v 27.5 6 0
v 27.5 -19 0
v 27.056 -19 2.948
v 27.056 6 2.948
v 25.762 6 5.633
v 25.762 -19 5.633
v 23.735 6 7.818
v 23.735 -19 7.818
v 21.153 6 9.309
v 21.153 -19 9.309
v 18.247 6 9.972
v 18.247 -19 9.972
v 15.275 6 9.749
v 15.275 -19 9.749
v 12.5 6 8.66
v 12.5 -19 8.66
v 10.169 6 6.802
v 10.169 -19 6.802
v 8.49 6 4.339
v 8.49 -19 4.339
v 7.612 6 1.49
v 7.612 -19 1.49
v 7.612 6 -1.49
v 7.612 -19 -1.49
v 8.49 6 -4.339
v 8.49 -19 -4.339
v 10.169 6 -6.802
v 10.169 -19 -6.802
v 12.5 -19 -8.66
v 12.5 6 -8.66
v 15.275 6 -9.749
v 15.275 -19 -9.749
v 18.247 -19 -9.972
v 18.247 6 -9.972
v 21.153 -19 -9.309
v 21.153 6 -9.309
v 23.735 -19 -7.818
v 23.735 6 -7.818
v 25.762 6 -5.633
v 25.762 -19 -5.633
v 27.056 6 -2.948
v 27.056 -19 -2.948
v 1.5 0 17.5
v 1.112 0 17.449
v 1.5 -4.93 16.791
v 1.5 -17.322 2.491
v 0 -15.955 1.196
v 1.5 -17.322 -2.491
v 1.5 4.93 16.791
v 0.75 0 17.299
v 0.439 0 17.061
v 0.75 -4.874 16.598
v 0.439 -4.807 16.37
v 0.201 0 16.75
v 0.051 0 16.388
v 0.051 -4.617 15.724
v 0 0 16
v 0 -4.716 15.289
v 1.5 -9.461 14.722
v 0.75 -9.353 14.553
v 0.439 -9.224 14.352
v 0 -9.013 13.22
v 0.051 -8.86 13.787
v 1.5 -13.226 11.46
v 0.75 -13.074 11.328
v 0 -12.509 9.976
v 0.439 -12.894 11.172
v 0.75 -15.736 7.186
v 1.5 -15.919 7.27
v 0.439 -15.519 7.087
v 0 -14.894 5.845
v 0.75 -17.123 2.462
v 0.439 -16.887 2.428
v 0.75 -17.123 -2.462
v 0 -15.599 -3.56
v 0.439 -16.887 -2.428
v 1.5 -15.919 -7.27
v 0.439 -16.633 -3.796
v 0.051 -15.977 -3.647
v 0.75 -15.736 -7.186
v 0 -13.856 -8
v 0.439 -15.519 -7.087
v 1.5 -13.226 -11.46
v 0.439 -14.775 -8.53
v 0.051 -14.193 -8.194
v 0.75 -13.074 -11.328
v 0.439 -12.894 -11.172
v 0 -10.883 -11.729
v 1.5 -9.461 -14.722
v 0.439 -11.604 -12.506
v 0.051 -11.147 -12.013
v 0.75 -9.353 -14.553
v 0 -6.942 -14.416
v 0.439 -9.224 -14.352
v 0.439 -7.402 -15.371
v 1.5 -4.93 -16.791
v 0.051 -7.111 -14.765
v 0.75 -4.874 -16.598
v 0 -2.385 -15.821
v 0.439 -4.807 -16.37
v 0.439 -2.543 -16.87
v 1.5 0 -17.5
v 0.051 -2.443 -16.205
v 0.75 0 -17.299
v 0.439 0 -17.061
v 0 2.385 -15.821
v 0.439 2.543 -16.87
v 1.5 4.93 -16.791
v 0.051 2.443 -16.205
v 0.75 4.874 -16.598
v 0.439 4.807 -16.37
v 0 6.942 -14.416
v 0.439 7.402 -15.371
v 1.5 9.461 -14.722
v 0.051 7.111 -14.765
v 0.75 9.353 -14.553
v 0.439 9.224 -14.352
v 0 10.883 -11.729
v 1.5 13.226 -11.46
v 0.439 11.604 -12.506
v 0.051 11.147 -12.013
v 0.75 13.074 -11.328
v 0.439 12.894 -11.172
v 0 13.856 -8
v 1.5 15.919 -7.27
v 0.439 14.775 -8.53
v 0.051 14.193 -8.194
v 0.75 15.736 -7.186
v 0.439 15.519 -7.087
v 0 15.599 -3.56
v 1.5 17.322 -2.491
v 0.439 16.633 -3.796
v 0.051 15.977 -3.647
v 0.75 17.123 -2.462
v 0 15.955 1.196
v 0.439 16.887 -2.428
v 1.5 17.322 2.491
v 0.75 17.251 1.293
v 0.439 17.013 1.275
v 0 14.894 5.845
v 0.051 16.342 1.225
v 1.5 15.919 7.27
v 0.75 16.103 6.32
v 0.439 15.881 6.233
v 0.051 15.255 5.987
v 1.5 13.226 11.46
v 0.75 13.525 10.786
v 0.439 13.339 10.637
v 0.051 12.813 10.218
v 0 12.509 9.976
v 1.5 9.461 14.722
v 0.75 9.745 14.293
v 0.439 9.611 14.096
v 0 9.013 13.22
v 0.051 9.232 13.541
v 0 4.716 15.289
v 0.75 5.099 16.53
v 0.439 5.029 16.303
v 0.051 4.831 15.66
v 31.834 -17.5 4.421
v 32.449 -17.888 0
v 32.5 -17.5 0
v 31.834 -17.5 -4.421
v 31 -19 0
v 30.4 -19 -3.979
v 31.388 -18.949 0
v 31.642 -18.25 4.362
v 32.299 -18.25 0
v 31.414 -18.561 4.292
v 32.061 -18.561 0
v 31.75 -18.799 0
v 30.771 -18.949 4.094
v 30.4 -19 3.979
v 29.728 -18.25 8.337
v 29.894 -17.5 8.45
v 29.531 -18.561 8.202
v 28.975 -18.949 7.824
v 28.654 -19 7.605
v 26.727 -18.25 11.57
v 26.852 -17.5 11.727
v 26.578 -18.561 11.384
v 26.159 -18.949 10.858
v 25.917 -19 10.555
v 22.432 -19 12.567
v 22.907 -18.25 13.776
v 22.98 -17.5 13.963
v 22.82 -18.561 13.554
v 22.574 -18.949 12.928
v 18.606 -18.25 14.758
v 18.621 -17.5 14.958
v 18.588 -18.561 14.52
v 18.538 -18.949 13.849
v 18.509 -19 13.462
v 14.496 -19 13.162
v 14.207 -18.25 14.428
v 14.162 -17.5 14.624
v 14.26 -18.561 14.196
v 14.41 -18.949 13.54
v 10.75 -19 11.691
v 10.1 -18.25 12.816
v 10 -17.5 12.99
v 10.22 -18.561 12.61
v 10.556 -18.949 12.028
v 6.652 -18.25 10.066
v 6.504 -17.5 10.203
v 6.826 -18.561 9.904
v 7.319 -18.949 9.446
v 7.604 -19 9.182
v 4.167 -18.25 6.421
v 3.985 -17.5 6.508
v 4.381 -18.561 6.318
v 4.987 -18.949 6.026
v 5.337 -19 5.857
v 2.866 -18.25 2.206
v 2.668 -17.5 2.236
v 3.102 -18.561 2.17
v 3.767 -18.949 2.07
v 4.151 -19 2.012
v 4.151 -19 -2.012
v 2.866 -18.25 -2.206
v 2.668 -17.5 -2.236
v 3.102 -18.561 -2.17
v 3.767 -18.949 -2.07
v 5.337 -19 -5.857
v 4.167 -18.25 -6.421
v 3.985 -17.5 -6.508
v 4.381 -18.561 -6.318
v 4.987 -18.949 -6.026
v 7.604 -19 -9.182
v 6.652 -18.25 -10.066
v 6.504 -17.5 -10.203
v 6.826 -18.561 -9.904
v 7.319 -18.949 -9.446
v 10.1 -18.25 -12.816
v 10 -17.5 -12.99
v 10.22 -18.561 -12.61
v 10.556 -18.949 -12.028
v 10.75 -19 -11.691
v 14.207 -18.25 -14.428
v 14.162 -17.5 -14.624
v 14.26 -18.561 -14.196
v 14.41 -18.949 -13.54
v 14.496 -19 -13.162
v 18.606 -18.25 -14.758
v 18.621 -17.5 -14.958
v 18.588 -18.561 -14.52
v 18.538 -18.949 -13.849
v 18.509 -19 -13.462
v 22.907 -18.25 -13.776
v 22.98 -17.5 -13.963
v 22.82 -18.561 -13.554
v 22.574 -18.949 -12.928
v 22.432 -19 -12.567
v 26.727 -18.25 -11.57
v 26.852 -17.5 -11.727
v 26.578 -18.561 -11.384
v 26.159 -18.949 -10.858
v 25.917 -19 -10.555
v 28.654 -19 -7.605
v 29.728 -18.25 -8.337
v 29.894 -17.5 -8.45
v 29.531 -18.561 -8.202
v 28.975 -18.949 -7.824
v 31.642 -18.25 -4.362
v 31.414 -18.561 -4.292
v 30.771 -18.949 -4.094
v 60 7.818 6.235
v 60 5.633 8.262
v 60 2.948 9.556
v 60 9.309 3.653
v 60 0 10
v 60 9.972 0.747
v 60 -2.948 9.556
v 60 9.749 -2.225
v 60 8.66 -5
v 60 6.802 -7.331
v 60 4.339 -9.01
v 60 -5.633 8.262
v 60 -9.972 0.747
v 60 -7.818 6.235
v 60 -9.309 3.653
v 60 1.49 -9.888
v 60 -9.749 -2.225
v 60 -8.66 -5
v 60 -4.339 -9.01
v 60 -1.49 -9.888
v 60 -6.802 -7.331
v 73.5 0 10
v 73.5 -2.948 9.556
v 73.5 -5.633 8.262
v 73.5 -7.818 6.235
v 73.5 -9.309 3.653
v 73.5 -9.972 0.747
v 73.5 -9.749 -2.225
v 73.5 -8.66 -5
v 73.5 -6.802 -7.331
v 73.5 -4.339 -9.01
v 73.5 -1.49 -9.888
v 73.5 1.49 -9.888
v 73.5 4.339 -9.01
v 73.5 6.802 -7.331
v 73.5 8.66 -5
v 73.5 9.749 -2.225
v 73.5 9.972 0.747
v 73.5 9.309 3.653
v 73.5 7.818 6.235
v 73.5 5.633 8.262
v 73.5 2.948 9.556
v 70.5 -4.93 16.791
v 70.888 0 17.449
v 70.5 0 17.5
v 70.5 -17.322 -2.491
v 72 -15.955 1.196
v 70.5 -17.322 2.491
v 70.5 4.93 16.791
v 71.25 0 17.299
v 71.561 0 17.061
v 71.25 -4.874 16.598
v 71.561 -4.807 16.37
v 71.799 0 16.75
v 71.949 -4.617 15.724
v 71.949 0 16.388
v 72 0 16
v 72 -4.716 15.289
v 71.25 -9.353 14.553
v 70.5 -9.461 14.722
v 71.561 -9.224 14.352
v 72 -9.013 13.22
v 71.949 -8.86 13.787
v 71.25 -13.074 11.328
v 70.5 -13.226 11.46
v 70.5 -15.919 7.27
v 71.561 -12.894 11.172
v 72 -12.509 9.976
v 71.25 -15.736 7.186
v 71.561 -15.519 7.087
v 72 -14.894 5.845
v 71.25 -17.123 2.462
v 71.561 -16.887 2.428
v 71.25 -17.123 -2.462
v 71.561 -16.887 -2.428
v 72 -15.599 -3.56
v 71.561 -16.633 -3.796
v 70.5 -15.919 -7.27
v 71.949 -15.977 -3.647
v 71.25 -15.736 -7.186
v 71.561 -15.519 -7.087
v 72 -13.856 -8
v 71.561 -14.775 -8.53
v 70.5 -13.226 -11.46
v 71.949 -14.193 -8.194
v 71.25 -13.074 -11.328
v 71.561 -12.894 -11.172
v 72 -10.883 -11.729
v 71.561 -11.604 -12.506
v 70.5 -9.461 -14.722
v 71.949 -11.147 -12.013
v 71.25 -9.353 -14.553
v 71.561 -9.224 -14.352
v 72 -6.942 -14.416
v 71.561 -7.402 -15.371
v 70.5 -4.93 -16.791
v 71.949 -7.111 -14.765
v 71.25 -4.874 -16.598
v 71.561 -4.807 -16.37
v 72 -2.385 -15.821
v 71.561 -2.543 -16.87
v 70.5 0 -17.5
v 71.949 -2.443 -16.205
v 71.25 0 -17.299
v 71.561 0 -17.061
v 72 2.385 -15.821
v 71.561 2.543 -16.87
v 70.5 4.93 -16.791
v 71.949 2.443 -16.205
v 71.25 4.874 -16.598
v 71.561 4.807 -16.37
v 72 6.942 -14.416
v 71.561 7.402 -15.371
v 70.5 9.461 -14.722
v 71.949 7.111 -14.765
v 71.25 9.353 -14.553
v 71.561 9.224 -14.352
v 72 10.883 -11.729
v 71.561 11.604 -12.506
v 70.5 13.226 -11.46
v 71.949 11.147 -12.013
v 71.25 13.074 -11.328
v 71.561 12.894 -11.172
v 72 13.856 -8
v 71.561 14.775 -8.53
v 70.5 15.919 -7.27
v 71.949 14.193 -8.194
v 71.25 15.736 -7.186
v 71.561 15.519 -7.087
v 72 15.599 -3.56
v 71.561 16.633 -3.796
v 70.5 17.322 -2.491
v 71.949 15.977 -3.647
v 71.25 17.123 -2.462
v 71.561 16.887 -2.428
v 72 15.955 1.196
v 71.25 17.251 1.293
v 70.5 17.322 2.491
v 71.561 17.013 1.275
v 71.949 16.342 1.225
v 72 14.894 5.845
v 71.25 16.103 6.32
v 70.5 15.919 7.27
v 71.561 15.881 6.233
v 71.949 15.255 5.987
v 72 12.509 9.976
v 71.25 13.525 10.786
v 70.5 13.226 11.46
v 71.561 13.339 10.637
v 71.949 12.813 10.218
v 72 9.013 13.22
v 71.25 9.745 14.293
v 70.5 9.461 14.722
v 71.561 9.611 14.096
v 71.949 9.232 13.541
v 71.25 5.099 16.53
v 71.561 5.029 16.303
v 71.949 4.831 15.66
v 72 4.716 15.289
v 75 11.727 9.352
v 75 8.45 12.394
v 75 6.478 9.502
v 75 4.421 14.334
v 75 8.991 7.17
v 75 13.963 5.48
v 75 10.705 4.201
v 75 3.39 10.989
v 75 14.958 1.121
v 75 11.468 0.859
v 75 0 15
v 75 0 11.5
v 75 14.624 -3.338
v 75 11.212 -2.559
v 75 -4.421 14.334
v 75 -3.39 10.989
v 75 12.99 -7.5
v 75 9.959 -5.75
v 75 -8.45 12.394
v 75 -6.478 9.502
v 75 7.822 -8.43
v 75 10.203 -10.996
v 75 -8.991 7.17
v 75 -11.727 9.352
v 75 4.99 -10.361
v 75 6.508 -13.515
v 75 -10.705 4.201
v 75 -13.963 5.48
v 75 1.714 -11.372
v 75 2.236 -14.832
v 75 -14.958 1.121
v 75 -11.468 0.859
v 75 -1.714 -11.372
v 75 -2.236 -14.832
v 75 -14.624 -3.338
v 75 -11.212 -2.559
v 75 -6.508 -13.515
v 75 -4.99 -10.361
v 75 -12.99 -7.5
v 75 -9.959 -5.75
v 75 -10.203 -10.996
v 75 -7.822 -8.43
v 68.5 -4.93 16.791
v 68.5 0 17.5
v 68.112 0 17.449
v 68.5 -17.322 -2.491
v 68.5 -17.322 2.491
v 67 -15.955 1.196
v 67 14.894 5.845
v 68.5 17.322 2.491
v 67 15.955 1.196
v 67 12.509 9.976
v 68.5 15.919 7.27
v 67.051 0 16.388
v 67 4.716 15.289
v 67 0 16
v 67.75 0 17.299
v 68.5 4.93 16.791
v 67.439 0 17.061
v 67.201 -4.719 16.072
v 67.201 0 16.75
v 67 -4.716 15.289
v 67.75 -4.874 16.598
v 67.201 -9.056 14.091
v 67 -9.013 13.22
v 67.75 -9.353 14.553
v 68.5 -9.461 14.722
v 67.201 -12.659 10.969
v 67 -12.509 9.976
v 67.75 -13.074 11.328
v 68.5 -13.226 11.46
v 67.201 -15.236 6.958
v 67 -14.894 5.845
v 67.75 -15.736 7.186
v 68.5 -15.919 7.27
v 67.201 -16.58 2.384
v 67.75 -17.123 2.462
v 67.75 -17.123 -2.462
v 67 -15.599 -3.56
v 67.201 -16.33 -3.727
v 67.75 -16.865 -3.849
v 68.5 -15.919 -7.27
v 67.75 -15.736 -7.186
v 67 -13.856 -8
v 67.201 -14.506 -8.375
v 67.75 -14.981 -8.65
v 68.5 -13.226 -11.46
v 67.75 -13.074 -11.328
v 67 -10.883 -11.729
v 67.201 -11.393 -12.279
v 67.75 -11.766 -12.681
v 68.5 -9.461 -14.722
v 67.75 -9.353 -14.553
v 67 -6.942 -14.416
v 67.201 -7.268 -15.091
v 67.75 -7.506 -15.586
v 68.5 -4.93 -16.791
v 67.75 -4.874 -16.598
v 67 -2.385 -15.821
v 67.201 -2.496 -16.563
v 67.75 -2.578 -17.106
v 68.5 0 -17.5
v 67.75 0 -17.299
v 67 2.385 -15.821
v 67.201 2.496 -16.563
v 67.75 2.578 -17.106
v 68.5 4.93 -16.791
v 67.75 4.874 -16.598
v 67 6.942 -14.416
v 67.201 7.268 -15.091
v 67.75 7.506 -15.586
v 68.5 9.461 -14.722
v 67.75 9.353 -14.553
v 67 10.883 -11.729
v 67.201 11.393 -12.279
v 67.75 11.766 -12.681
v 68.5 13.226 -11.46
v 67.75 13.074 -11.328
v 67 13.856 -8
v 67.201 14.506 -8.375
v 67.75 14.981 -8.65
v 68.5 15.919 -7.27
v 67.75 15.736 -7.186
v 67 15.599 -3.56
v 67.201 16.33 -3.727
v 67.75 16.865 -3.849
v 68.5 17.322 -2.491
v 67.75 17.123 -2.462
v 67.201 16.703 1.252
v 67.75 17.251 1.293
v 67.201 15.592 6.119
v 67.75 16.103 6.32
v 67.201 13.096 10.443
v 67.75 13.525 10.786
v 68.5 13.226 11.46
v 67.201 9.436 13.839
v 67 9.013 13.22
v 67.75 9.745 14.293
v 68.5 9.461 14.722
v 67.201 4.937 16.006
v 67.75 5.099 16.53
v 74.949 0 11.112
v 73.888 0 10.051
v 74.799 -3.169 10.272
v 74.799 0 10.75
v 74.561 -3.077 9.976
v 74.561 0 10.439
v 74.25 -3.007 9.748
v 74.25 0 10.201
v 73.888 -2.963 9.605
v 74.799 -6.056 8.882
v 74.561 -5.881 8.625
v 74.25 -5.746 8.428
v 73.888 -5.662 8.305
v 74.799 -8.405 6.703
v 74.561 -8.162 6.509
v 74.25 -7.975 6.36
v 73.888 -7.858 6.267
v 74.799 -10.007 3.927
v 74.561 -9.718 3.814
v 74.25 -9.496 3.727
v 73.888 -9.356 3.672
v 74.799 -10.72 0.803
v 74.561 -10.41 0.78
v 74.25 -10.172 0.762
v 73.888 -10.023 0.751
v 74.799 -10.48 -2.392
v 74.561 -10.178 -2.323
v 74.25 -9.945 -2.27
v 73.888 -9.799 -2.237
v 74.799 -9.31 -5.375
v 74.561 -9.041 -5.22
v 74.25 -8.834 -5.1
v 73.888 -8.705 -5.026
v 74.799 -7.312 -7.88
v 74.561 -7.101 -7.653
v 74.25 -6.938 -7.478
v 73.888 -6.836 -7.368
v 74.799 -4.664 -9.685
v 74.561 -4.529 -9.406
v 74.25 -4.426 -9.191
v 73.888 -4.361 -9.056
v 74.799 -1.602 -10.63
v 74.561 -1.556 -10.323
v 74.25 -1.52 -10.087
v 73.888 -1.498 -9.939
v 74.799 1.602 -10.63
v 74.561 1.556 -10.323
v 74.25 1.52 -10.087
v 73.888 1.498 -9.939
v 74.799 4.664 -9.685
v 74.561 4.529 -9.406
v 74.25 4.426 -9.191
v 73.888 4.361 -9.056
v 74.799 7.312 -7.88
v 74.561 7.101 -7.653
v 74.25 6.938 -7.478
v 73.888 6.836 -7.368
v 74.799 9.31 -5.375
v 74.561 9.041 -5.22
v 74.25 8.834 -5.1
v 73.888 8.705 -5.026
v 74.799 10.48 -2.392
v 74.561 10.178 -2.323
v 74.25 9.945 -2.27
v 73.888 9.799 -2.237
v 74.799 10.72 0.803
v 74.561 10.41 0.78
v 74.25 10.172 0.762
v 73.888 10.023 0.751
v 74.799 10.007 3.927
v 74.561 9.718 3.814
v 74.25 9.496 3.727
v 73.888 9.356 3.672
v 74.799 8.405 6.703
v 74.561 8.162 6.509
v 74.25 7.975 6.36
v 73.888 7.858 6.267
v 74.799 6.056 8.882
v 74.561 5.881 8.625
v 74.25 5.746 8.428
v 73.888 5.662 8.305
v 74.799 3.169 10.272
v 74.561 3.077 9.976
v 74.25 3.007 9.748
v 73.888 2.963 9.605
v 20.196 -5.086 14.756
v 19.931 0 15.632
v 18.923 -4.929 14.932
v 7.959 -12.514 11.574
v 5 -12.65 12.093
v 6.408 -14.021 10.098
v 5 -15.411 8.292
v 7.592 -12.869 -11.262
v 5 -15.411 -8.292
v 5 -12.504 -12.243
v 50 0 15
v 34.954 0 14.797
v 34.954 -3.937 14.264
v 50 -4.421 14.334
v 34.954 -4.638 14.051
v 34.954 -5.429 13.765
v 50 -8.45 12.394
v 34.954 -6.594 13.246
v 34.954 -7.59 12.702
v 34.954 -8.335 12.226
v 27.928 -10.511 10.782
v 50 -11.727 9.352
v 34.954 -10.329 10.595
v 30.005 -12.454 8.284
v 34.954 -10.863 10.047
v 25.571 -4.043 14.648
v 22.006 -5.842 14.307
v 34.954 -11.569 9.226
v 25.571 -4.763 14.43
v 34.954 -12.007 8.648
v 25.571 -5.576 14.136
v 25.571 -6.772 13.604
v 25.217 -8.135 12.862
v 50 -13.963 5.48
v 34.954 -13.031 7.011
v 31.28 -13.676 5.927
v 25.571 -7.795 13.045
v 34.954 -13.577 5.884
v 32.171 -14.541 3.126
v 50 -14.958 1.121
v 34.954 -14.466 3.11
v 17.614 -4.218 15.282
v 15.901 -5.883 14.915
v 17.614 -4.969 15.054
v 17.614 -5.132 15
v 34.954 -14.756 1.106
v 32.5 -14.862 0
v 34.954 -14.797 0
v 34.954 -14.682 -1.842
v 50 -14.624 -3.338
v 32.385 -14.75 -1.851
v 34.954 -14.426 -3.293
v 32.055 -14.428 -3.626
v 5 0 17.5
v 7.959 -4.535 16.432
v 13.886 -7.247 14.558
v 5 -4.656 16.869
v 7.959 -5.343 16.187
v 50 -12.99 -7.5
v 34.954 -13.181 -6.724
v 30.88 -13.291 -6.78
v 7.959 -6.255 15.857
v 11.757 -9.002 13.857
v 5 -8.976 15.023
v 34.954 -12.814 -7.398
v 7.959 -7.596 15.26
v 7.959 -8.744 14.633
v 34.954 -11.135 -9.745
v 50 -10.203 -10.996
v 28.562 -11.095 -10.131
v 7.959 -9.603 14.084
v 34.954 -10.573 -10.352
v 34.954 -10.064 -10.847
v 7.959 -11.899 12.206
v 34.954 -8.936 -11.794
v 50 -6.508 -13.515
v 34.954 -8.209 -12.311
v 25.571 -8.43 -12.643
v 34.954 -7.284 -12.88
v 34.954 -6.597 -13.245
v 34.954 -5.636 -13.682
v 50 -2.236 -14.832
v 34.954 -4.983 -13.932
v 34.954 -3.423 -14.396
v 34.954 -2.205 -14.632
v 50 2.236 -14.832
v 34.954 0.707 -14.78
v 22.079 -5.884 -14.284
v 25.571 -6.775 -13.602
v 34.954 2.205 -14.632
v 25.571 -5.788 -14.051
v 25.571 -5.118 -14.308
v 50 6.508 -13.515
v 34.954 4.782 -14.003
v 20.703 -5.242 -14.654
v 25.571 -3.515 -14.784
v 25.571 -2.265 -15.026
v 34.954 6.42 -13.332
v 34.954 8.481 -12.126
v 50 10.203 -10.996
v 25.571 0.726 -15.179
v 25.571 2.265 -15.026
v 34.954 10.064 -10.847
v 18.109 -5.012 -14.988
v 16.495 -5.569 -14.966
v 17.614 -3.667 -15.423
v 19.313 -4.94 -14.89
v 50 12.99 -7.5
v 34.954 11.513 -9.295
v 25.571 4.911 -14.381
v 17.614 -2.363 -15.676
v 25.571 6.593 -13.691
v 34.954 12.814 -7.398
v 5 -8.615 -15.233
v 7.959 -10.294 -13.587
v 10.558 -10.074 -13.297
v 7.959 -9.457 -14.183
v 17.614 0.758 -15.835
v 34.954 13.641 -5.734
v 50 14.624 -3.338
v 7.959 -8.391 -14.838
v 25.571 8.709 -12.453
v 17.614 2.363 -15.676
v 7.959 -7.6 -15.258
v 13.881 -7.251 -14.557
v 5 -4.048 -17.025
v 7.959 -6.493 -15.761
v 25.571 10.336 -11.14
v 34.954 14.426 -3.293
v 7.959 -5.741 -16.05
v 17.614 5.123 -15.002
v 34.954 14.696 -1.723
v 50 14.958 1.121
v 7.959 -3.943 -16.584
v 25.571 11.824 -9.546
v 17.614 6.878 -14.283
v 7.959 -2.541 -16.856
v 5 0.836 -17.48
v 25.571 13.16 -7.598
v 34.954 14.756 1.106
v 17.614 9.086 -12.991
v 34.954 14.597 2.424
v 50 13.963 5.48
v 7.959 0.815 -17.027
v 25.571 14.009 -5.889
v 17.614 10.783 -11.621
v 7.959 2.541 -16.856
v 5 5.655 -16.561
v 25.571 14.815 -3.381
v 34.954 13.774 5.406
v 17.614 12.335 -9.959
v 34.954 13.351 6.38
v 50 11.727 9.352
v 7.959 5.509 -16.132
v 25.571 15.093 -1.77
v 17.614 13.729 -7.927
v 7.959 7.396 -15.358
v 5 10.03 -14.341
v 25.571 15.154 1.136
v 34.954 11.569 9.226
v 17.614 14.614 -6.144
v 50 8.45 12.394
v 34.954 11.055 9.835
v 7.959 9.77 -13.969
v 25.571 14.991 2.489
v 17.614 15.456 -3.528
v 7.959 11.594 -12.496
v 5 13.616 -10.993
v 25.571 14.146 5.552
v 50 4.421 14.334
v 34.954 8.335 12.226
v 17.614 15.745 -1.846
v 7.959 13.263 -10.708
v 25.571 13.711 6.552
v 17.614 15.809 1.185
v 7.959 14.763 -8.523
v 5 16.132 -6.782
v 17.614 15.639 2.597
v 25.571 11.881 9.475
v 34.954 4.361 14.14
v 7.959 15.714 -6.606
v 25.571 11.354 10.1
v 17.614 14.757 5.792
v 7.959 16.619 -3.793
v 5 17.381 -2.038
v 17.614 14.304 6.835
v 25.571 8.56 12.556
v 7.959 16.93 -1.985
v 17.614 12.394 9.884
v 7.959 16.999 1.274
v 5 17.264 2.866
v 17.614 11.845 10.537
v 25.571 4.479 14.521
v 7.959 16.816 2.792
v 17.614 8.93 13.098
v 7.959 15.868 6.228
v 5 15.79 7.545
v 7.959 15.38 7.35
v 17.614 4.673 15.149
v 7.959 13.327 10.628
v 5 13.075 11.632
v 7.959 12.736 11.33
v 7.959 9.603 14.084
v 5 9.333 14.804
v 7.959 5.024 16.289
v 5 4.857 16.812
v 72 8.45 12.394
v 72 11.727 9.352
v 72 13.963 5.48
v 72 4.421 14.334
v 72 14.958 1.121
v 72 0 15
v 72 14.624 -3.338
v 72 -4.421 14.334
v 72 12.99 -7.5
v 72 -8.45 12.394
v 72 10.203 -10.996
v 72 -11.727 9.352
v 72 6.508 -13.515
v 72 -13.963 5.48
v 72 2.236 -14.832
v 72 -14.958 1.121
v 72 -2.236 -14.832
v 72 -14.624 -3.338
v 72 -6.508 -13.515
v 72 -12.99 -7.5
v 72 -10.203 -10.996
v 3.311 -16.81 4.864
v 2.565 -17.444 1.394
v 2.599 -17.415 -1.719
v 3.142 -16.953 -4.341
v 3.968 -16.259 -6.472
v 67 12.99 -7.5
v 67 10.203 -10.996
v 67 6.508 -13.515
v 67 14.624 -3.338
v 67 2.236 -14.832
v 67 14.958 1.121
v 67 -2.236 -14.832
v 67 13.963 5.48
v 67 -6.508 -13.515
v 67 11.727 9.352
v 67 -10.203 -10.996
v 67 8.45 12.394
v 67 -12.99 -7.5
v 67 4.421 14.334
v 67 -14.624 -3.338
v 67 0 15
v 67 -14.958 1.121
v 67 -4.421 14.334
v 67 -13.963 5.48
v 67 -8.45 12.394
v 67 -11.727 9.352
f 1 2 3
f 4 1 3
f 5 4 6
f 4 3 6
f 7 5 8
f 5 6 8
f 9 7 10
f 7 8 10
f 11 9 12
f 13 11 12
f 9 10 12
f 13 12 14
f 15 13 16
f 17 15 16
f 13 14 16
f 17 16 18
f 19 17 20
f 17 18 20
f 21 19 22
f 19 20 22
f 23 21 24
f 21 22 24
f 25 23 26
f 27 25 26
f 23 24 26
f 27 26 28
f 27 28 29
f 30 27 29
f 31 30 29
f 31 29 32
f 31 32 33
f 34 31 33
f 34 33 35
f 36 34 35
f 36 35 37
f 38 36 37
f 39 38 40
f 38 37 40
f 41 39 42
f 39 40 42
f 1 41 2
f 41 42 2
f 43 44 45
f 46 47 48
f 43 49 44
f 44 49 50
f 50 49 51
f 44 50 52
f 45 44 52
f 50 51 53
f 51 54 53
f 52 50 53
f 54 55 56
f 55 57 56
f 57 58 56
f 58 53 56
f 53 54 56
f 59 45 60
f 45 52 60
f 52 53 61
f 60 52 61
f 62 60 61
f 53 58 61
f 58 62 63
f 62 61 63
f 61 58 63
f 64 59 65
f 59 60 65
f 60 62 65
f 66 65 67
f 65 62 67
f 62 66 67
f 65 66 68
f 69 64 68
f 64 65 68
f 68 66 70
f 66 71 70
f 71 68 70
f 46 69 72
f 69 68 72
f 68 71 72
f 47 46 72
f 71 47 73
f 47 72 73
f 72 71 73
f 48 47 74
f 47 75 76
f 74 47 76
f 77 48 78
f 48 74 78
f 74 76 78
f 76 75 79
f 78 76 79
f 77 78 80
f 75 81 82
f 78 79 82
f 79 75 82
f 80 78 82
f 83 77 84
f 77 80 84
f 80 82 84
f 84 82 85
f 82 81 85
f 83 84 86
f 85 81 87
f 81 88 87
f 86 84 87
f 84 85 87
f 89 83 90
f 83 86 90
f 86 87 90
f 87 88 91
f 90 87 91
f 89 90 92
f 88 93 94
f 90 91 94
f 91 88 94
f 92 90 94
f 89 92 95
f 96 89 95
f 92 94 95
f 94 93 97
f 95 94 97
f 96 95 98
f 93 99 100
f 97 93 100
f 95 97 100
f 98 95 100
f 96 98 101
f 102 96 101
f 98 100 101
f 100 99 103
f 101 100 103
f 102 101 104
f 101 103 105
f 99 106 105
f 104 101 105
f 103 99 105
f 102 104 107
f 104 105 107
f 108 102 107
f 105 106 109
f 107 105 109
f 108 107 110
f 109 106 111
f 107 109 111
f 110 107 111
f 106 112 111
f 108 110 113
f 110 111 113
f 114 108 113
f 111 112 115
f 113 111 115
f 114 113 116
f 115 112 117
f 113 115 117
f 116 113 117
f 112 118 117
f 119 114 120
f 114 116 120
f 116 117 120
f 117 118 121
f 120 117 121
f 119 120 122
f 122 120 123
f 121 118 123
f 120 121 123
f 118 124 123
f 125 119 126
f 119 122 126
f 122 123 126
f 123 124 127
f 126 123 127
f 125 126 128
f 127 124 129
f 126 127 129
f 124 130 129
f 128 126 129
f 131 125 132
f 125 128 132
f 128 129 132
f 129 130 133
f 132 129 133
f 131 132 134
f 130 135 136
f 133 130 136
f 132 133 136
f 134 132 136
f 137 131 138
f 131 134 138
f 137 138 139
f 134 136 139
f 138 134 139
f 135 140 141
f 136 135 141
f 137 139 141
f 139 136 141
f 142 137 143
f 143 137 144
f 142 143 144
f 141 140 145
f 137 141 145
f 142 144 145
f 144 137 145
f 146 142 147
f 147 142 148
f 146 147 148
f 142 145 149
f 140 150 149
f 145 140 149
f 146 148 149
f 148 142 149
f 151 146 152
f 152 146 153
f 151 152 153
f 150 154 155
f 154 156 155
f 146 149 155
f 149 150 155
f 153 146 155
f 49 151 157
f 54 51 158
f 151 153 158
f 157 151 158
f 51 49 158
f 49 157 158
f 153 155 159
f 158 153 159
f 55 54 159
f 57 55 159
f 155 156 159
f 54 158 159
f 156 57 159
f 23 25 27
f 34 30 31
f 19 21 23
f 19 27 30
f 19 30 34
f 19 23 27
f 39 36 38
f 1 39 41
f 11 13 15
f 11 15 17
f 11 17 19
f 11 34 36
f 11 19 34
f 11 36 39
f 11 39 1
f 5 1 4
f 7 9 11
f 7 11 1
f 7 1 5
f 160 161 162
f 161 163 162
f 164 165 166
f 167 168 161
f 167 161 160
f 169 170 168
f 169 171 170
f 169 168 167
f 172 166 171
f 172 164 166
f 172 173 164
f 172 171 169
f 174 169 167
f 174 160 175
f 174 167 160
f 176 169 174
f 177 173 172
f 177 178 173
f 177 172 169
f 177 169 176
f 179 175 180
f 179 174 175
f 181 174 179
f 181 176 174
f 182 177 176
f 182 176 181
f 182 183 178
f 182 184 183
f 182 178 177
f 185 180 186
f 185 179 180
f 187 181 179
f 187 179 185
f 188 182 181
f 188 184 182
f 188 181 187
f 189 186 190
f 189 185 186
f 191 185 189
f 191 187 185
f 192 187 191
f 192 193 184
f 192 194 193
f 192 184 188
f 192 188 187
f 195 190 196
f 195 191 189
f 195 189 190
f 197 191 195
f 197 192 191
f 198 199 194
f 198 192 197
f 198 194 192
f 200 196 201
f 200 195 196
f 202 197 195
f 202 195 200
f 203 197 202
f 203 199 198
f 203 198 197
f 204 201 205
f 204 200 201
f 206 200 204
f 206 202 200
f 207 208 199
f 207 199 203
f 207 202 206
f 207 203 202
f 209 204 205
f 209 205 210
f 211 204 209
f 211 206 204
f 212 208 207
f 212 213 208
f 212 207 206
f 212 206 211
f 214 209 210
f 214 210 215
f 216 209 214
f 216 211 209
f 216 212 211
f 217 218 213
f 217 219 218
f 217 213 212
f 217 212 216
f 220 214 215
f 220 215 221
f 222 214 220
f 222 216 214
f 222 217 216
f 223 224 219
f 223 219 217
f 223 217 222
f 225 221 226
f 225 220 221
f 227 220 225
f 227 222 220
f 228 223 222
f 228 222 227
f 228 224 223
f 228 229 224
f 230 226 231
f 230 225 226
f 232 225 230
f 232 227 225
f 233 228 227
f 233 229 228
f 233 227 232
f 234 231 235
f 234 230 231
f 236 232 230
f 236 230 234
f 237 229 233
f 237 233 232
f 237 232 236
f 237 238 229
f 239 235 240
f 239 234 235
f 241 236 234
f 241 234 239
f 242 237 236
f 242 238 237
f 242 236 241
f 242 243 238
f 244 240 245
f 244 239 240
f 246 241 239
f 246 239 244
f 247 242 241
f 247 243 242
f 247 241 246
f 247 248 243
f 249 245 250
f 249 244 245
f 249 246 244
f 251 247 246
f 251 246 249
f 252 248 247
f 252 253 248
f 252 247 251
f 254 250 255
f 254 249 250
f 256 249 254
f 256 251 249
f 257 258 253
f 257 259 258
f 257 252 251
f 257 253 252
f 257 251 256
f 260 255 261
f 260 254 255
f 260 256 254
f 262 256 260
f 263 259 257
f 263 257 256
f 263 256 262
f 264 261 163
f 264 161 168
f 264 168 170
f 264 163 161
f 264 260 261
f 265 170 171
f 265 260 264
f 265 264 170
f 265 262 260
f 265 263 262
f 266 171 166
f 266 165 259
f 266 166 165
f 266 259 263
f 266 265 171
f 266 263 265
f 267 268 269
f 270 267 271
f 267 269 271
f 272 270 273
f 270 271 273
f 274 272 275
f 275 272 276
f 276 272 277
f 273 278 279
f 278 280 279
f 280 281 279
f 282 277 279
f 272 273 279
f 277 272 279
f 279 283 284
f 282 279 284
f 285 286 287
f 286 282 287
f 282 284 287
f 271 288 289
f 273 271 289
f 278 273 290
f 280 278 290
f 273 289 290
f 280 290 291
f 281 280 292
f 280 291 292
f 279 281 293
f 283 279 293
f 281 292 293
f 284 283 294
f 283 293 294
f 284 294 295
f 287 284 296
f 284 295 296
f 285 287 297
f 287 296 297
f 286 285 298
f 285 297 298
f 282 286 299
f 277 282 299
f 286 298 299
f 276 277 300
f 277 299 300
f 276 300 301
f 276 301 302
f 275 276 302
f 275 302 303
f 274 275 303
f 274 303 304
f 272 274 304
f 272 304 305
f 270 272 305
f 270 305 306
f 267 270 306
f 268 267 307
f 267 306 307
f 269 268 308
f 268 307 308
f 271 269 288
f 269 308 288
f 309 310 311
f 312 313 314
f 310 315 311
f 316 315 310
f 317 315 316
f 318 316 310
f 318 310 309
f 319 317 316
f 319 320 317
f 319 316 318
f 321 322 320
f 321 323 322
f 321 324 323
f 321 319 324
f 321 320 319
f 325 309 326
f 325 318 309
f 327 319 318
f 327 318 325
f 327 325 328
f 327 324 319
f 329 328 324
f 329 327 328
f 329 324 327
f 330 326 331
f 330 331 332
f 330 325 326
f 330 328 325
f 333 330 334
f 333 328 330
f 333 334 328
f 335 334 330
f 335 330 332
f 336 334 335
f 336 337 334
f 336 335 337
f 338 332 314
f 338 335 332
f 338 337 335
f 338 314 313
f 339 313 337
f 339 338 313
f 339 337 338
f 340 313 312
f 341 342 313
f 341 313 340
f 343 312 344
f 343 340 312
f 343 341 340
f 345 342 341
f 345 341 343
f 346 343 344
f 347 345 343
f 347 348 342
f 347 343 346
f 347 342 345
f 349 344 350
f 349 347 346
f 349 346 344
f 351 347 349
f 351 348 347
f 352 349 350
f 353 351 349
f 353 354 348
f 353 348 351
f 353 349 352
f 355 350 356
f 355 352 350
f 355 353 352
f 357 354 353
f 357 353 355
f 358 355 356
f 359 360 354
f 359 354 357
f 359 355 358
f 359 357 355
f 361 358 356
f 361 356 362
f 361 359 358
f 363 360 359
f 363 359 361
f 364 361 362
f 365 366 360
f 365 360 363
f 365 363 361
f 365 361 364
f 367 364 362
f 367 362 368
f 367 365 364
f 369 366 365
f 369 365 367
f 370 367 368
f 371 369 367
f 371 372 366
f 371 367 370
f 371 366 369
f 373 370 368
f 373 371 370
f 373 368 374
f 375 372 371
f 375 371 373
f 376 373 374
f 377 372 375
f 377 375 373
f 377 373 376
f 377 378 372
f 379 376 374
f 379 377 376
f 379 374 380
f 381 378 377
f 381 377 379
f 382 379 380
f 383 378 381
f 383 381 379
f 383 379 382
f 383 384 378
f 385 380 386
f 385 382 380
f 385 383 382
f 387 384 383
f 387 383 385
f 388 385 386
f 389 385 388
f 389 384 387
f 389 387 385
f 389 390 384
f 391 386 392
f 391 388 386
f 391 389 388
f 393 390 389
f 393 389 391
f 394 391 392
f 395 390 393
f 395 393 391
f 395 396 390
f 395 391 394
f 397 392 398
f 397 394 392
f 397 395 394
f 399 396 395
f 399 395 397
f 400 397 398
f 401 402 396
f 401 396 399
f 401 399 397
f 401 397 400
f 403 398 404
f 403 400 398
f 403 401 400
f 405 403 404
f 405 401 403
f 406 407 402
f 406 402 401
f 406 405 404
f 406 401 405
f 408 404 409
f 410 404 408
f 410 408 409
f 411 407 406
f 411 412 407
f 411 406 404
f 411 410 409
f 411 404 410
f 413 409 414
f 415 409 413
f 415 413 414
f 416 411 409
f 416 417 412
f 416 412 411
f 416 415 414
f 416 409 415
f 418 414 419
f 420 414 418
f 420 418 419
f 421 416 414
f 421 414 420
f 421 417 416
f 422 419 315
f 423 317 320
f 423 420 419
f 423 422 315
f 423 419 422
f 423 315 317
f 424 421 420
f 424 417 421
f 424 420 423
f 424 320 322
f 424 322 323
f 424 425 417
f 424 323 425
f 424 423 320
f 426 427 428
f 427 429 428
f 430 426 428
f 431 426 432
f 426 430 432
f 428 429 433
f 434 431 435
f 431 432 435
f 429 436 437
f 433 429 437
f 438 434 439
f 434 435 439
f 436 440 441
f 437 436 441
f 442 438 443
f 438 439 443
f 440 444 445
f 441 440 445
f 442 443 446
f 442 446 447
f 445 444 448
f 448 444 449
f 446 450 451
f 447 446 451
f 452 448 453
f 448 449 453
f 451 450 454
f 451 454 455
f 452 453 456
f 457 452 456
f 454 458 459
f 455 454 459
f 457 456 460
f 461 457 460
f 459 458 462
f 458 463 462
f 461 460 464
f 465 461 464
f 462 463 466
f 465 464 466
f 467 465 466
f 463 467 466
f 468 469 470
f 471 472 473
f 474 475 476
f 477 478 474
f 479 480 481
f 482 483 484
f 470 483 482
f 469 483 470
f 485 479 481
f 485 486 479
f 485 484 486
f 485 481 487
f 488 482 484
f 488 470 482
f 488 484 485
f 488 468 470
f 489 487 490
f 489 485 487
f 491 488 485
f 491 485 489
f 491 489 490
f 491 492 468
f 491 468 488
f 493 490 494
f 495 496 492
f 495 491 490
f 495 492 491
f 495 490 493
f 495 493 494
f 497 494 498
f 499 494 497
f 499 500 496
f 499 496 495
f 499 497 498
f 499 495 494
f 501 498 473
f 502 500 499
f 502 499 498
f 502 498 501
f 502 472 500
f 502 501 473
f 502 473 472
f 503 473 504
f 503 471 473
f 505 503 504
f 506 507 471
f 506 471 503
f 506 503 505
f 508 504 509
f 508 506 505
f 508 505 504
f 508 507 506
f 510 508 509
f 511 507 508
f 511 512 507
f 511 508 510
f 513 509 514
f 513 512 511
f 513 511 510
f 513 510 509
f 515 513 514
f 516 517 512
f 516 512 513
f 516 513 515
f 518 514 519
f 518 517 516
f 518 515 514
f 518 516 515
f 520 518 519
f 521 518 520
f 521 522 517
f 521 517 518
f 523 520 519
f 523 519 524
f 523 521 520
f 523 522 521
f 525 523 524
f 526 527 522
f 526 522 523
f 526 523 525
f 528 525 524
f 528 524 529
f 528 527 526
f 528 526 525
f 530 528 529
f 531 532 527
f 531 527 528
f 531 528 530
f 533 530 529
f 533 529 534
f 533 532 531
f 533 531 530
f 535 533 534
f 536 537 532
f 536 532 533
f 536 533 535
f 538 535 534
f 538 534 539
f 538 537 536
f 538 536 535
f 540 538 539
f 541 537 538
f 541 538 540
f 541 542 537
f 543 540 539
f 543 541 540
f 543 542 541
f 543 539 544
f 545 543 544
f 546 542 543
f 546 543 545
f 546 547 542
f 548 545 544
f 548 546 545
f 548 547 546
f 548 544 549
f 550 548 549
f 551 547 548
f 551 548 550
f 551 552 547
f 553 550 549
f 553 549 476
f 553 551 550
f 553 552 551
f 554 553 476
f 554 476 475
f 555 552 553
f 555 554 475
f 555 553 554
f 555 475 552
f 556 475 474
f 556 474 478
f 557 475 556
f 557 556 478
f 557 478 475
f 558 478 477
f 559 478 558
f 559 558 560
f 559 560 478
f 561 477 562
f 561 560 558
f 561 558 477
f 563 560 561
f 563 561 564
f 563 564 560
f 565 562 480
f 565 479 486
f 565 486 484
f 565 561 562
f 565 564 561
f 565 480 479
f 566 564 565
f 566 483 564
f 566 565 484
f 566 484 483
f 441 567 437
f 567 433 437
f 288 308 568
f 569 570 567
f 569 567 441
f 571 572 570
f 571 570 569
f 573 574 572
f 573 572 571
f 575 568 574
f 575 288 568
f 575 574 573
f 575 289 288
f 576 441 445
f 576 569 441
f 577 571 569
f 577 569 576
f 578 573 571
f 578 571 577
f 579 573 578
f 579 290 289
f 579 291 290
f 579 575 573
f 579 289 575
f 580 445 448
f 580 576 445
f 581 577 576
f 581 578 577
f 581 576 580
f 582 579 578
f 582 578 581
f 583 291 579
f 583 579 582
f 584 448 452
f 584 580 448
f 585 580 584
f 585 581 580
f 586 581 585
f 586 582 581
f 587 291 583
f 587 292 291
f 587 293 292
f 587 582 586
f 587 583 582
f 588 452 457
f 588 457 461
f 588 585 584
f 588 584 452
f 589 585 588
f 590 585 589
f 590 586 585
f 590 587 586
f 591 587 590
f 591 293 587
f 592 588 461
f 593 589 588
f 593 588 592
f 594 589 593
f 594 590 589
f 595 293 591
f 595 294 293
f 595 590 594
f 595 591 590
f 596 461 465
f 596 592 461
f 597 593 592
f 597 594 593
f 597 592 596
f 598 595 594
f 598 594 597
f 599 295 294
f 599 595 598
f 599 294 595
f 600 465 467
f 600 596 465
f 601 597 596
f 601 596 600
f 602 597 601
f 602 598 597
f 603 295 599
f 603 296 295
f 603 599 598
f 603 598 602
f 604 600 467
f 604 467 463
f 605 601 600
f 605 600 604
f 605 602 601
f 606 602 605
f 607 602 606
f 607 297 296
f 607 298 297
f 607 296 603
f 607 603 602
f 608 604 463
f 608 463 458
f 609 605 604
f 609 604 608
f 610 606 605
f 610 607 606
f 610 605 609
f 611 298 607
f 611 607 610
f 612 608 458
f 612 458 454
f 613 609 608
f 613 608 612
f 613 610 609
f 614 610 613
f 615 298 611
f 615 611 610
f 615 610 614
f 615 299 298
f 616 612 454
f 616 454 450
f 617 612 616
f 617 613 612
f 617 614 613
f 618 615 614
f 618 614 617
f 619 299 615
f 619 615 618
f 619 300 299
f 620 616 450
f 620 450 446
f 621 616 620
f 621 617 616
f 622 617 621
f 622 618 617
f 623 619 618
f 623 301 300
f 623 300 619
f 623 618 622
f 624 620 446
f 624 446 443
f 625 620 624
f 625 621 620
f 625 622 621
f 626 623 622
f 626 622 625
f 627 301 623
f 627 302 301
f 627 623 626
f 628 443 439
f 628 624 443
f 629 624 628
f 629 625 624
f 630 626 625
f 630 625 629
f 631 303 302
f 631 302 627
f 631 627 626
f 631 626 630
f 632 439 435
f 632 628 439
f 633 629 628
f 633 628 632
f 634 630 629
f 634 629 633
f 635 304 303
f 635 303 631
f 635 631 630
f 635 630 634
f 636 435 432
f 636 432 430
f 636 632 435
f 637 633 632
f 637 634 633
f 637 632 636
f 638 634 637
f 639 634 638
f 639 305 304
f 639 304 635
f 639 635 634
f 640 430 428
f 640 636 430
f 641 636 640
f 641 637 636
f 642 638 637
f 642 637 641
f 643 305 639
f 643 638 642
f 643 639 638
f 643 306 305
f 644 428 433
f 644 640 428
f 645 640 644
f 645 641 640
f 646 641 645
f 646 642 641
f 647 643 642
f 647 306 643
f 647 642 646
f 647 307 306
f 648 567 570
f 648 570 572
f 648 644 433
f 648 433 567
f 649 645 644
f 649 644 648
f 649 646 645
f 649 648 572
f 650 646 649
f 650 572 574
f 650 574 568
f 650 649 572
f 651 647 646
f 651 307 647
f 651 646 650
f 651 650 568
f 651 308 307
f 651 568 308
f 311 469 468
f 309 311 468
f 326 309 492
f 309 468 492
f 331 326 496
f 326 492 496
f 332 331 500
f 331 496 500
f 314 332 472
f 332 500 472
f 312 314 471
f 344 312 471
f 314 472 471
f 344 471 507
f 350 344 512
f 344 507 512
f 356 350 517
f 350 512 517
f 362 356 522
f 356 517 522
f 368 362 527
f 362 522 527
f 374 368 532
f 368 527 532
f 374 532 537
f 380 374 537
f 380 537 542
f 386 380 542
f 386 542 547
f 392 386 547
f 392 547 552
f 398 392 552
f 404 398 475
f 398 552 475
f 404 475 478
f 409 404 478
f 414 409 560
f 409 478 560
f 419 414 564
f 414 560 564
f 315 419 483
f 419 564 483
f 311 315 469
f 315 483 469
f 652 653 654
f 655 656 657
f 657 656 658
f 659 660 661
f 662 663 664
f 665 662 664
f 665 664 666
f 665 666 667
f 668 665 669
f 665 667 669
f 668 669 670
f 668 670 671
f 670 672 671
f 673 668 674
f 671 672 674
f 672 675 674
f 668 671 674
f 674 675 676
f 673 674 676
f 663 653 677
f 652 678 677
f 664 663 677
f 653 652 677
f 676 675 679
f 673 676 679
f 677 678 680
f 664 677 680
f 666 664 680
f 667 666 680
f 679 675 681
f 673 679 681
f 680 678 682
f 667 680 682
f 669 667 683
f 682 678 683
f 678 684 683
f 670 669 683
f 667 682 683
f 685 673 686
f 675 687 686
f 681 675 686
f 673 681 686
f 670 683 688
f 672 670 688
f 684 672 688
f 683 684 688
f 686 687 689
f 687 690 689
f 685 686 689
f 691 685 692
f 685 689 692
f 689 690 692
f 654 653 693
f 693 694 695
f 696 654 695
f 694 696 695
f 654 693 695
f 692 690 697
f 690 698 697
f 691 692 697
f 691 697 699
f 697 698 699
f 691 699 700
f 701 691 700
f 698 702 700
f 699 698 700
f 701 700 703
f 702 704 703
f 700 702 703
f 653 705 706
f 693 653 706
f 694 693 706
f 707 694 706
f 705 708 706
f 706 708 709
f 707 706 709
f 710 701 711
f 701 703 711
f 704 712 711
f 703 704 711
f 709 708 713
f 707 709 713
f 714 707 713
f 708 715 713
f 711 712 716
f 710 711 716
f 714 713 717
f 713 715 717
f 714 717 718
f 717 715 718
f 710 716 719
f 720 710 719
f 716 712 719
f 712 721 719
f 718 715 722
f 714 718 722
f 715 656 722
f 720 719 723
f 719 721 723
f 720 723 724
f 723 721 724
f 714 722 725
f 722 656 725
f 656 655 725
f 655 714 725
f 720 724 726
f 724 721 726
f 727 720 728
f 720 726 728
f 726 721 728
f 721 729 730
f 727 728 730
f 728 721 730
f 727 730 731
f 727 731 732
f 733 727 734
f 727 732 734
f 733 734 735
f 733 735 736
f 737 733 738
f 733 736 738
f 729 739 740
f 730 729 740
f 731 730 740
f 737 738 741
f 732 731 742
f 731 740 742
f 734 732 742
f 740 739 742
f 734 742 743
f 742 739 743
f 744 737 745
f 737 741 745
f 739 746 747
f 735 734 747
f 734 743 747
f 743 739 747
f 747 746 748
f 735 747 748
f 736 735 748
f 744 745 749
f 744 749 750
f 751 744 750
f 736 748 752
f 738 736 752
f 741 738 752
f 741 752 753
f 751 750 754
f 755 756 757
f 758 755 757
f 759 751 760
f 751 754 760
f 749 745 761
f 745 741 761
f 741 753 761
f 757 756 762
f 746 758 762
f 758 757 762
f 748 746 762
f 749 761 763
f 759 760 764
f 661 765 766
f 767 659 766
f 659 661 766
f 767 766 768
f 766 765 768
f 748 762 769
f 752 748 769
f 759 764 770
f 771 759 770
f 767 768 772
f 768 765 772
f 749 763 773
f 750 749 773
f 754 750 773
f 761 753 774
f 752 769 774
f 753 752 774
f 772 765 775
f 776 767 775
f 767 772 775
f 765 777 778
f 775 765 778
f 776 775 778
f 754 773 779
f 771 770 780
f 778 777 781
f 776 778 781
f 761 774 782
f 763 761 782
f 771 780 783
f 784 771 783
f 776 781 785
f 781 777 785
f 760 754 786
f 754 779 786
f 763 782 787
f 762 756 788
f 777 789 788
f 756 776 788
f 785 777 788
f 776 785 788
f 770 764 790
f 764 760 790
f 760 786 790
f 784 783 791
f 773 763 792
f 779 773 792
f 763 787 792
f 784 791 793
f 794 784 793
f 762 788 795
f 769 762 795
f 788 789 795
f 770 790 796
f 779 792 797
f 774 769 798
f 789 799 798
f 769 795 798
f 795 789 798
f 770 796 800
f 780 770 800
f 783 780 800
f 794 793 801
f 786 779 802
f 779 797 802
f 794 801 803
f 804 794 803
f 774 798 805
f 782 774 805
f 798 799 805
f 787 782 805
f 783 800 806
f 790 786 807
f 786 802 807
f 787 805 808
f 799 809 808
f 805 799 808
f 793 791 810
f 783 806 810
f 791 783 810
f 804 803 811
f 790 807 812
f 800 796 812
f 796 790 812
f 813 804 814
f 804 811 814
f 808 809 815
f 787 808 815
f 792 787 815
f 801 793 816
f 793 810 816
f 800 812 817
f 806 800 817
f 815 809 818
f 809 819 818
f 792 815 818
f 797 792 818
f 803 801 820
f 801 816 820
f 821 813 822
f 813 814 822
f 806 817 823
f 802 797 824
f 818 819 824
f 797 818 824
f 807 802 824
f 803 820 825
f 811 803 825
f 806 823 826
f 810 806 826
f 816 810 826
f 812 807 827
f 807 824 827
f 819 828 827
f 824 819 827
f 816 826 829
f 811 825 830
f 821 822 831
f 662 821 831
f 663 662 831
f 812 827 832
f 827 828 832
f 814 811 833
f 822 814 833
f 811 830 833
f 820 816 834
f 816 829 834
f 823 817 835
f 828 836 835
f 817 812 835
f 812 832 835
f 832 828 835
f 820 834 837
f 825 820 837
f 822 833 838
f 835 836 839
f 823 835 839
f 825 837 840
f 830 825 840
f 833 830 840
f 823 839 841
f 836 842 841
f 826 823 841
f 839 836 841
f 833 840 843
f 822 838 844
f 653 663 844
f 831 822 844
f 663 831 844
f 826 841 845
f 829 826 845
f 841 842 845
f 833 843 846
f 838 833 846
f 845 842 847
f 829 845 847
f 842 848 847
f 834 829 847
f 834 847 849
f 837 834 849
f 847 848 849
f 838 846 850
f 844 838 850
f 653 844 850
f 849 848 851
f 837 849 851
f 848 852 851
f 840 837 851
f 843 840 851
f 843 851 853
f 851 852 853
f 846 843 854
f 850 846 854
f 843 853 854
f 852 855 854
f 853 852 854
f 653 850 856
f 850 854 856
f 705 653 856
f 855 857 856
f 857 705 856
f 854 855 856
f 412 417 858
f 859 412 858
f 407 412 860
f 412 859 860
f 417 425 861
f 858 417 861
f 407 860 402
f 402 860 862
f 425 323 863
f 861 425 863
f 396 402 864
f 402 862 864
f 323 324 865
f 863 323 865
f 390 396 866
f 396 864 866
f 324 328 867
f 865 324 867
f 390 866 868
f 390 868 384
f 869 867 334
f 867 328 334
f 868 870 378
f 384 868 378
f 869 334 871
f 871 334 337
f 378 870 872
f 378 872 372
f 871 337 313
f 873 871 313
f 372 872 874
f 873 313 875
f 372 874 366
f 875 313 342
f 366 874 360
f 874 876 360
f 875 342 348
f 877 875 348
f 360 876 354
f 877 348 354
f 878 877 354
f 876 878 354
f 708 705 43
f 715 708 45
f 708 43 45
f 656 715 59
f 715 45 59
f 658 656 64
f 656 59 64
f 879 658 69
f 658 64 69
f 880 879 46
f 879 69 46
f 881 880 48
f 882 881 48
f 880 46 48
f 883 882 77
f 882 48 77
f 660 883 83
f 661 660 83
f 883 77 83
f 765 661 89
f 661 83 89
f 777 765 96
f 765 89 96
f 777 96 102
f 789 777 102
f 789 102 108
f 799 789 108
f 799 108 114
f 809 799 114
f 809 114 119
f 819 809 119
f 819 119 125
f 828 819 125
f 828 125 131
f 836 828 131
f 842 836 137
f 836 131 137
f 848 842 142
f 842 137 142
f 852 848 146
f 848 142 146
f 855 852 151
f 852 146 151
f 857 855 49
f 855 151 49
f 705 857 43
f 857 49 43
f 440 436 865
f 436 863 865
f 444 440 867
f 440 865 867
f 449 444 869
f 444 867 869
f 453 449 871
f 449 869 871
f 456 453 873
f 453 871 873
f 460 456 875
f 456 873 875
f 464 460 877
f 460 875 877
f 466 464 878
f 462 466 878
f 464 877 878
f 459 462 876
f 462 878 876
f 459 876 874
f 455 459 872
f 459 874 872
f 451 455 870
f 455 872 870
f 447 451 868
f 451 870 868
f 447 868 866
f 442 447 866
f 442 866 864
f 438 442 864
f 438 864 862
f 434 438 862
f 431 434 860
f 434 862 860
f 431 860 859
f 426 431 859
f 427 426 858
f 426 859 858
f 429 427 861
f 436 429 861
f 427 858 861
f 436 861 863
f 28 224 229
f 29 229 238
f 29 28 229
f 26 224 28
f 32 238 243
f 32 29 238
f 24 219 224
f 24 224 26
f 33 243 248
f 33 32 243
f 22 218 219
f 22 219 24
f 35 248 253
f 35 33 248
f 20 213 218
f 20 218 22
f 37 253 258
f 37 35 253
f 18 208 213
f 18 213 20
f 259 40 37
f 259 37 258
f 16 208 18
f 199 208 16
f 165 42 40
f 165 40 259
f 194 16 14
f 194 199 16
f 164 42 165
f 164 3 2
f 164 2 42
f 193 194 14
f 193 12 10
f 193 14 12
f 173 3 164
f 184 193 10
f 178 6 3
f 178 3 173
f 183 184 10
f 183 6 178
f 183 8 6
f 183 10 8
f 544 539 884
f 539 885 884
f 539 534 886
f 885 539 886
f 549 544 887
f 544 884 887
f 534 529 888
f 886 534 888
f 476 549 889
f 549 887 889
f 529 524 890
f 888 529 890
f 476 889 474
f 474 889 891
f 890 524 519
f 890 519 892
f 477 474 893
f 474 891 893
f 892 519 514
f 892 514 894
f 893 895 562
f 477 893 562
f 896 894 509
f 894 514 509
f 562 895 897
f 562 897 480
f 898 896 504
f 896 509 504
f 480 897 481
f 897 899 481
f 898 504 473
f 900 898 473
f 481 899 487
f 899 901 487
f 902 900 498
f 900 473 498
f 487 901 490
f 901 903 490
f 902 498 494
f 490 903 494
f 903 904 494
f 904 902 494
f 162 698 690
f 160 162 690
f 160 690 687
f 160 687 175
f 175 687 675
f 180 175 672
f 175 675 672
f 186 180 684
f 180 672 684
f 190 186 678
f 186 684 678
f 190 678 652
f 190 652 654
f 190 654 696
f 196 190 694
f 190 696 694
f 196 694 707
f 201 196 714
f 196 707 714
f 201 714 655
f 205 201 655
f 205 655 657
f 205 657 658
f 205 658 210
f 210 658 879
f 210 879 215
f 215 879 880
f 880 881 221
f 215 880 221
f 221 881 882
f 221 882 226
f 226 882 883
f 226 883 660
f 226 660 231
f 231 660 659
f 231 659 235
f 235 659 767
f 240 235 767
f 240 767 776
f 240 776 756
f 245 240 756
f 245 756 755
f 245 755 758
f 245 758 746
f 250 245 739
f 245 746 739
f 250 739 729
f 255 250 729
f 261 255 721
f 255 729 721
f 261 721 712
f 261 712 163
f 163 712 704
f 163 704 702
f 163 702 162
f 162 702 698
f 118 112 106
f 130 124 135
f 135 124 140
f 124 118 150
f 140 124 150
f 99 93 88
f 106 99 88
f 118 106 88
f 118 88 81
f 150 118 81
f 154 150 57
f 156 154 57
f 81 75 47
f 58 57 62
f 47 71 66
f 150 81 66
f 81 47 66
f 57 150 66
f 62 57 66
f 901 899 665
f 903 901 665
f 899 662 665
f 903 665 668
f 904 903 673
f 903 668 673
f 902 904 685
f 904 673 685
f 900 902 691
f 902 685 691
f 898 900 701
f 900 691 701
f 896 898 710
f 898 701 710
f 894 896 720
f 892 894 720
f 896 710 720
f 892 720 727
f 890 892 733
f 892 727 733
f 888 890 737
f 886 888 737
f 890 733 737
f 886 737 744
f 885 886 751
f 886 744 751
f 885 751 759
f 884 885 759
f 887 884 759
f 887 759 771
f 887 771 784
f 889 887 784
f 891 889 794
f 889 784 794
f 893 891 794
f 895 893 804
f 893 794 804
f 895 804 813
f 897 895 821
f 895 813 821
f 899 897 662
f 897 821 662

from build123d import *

# Parameters (mm, degrees)
F2_R     = 15
F3_DEPTH = 19
F4_R     = 10
F5_DEPTH = 25
F6_R     = 1.5
F7_R     = 1.5


with BuildPart() as f1:
    # F0 (on Front) → F1 (revolve)
    with BuildSketch(Plane.XZ):
        with BuildLine():
            Line((5, 17.5), (0, 17.5))
            Line((0, 17.5), (0, 0))
            Line((0, 0), (60, 0))
            Line((60, 0), (60, 10))
            Line((60, 10), (75, 10))
            Line((75, 10), (75, 15))
            Line((75, 15), (72, 15))
            Line((72, 15), (72, 17.5))
            Line((72, 17.5), (67, 17.5))
            Line((67, 17.5), (67, 15))
            Line((67, 15), (50, 15))
            ThreePointArc((50, 15), (27.435257, 15.084628), (5, 17.5))
        make_face()
    revolve(axis=Axis((30, 0, 0), (1, 0, 0)))

    # F2 (on Front) → F3 (join)
    with BuildSketch(Plane.XZ):
        with Locations((17.5, 0)):
            Circle(F2_R)
    extrude(amount=F3_DEPTH)

    # F4 (on face) → F5 (cut)
    with BuildSketch(Plane.XZ.offset(19)):
        with Locations((17.5, 0)):
            Circle(F4_R)
    extrude(amount=-F5_DEPTH, mode=Mode.SUBTRACT)

    # F6
    f6_edges = [f1.edges().sort_by_distance(p)[0] for p in [
        (0, 0, -17.5),
        (2.5, -19, 0),
        (67, 0, -17.5),
        (75, 0, -10),
    ]]
    fillet(f6_edges, radius=F6_R)

    # F7
    f7_edges = [f1.edges().sort_by_distance(p)[0] for p in [
        (72, 0, -17.5),
    ]]
    fillet(f7_edges, radius=F7_R)


solid = f1.part
